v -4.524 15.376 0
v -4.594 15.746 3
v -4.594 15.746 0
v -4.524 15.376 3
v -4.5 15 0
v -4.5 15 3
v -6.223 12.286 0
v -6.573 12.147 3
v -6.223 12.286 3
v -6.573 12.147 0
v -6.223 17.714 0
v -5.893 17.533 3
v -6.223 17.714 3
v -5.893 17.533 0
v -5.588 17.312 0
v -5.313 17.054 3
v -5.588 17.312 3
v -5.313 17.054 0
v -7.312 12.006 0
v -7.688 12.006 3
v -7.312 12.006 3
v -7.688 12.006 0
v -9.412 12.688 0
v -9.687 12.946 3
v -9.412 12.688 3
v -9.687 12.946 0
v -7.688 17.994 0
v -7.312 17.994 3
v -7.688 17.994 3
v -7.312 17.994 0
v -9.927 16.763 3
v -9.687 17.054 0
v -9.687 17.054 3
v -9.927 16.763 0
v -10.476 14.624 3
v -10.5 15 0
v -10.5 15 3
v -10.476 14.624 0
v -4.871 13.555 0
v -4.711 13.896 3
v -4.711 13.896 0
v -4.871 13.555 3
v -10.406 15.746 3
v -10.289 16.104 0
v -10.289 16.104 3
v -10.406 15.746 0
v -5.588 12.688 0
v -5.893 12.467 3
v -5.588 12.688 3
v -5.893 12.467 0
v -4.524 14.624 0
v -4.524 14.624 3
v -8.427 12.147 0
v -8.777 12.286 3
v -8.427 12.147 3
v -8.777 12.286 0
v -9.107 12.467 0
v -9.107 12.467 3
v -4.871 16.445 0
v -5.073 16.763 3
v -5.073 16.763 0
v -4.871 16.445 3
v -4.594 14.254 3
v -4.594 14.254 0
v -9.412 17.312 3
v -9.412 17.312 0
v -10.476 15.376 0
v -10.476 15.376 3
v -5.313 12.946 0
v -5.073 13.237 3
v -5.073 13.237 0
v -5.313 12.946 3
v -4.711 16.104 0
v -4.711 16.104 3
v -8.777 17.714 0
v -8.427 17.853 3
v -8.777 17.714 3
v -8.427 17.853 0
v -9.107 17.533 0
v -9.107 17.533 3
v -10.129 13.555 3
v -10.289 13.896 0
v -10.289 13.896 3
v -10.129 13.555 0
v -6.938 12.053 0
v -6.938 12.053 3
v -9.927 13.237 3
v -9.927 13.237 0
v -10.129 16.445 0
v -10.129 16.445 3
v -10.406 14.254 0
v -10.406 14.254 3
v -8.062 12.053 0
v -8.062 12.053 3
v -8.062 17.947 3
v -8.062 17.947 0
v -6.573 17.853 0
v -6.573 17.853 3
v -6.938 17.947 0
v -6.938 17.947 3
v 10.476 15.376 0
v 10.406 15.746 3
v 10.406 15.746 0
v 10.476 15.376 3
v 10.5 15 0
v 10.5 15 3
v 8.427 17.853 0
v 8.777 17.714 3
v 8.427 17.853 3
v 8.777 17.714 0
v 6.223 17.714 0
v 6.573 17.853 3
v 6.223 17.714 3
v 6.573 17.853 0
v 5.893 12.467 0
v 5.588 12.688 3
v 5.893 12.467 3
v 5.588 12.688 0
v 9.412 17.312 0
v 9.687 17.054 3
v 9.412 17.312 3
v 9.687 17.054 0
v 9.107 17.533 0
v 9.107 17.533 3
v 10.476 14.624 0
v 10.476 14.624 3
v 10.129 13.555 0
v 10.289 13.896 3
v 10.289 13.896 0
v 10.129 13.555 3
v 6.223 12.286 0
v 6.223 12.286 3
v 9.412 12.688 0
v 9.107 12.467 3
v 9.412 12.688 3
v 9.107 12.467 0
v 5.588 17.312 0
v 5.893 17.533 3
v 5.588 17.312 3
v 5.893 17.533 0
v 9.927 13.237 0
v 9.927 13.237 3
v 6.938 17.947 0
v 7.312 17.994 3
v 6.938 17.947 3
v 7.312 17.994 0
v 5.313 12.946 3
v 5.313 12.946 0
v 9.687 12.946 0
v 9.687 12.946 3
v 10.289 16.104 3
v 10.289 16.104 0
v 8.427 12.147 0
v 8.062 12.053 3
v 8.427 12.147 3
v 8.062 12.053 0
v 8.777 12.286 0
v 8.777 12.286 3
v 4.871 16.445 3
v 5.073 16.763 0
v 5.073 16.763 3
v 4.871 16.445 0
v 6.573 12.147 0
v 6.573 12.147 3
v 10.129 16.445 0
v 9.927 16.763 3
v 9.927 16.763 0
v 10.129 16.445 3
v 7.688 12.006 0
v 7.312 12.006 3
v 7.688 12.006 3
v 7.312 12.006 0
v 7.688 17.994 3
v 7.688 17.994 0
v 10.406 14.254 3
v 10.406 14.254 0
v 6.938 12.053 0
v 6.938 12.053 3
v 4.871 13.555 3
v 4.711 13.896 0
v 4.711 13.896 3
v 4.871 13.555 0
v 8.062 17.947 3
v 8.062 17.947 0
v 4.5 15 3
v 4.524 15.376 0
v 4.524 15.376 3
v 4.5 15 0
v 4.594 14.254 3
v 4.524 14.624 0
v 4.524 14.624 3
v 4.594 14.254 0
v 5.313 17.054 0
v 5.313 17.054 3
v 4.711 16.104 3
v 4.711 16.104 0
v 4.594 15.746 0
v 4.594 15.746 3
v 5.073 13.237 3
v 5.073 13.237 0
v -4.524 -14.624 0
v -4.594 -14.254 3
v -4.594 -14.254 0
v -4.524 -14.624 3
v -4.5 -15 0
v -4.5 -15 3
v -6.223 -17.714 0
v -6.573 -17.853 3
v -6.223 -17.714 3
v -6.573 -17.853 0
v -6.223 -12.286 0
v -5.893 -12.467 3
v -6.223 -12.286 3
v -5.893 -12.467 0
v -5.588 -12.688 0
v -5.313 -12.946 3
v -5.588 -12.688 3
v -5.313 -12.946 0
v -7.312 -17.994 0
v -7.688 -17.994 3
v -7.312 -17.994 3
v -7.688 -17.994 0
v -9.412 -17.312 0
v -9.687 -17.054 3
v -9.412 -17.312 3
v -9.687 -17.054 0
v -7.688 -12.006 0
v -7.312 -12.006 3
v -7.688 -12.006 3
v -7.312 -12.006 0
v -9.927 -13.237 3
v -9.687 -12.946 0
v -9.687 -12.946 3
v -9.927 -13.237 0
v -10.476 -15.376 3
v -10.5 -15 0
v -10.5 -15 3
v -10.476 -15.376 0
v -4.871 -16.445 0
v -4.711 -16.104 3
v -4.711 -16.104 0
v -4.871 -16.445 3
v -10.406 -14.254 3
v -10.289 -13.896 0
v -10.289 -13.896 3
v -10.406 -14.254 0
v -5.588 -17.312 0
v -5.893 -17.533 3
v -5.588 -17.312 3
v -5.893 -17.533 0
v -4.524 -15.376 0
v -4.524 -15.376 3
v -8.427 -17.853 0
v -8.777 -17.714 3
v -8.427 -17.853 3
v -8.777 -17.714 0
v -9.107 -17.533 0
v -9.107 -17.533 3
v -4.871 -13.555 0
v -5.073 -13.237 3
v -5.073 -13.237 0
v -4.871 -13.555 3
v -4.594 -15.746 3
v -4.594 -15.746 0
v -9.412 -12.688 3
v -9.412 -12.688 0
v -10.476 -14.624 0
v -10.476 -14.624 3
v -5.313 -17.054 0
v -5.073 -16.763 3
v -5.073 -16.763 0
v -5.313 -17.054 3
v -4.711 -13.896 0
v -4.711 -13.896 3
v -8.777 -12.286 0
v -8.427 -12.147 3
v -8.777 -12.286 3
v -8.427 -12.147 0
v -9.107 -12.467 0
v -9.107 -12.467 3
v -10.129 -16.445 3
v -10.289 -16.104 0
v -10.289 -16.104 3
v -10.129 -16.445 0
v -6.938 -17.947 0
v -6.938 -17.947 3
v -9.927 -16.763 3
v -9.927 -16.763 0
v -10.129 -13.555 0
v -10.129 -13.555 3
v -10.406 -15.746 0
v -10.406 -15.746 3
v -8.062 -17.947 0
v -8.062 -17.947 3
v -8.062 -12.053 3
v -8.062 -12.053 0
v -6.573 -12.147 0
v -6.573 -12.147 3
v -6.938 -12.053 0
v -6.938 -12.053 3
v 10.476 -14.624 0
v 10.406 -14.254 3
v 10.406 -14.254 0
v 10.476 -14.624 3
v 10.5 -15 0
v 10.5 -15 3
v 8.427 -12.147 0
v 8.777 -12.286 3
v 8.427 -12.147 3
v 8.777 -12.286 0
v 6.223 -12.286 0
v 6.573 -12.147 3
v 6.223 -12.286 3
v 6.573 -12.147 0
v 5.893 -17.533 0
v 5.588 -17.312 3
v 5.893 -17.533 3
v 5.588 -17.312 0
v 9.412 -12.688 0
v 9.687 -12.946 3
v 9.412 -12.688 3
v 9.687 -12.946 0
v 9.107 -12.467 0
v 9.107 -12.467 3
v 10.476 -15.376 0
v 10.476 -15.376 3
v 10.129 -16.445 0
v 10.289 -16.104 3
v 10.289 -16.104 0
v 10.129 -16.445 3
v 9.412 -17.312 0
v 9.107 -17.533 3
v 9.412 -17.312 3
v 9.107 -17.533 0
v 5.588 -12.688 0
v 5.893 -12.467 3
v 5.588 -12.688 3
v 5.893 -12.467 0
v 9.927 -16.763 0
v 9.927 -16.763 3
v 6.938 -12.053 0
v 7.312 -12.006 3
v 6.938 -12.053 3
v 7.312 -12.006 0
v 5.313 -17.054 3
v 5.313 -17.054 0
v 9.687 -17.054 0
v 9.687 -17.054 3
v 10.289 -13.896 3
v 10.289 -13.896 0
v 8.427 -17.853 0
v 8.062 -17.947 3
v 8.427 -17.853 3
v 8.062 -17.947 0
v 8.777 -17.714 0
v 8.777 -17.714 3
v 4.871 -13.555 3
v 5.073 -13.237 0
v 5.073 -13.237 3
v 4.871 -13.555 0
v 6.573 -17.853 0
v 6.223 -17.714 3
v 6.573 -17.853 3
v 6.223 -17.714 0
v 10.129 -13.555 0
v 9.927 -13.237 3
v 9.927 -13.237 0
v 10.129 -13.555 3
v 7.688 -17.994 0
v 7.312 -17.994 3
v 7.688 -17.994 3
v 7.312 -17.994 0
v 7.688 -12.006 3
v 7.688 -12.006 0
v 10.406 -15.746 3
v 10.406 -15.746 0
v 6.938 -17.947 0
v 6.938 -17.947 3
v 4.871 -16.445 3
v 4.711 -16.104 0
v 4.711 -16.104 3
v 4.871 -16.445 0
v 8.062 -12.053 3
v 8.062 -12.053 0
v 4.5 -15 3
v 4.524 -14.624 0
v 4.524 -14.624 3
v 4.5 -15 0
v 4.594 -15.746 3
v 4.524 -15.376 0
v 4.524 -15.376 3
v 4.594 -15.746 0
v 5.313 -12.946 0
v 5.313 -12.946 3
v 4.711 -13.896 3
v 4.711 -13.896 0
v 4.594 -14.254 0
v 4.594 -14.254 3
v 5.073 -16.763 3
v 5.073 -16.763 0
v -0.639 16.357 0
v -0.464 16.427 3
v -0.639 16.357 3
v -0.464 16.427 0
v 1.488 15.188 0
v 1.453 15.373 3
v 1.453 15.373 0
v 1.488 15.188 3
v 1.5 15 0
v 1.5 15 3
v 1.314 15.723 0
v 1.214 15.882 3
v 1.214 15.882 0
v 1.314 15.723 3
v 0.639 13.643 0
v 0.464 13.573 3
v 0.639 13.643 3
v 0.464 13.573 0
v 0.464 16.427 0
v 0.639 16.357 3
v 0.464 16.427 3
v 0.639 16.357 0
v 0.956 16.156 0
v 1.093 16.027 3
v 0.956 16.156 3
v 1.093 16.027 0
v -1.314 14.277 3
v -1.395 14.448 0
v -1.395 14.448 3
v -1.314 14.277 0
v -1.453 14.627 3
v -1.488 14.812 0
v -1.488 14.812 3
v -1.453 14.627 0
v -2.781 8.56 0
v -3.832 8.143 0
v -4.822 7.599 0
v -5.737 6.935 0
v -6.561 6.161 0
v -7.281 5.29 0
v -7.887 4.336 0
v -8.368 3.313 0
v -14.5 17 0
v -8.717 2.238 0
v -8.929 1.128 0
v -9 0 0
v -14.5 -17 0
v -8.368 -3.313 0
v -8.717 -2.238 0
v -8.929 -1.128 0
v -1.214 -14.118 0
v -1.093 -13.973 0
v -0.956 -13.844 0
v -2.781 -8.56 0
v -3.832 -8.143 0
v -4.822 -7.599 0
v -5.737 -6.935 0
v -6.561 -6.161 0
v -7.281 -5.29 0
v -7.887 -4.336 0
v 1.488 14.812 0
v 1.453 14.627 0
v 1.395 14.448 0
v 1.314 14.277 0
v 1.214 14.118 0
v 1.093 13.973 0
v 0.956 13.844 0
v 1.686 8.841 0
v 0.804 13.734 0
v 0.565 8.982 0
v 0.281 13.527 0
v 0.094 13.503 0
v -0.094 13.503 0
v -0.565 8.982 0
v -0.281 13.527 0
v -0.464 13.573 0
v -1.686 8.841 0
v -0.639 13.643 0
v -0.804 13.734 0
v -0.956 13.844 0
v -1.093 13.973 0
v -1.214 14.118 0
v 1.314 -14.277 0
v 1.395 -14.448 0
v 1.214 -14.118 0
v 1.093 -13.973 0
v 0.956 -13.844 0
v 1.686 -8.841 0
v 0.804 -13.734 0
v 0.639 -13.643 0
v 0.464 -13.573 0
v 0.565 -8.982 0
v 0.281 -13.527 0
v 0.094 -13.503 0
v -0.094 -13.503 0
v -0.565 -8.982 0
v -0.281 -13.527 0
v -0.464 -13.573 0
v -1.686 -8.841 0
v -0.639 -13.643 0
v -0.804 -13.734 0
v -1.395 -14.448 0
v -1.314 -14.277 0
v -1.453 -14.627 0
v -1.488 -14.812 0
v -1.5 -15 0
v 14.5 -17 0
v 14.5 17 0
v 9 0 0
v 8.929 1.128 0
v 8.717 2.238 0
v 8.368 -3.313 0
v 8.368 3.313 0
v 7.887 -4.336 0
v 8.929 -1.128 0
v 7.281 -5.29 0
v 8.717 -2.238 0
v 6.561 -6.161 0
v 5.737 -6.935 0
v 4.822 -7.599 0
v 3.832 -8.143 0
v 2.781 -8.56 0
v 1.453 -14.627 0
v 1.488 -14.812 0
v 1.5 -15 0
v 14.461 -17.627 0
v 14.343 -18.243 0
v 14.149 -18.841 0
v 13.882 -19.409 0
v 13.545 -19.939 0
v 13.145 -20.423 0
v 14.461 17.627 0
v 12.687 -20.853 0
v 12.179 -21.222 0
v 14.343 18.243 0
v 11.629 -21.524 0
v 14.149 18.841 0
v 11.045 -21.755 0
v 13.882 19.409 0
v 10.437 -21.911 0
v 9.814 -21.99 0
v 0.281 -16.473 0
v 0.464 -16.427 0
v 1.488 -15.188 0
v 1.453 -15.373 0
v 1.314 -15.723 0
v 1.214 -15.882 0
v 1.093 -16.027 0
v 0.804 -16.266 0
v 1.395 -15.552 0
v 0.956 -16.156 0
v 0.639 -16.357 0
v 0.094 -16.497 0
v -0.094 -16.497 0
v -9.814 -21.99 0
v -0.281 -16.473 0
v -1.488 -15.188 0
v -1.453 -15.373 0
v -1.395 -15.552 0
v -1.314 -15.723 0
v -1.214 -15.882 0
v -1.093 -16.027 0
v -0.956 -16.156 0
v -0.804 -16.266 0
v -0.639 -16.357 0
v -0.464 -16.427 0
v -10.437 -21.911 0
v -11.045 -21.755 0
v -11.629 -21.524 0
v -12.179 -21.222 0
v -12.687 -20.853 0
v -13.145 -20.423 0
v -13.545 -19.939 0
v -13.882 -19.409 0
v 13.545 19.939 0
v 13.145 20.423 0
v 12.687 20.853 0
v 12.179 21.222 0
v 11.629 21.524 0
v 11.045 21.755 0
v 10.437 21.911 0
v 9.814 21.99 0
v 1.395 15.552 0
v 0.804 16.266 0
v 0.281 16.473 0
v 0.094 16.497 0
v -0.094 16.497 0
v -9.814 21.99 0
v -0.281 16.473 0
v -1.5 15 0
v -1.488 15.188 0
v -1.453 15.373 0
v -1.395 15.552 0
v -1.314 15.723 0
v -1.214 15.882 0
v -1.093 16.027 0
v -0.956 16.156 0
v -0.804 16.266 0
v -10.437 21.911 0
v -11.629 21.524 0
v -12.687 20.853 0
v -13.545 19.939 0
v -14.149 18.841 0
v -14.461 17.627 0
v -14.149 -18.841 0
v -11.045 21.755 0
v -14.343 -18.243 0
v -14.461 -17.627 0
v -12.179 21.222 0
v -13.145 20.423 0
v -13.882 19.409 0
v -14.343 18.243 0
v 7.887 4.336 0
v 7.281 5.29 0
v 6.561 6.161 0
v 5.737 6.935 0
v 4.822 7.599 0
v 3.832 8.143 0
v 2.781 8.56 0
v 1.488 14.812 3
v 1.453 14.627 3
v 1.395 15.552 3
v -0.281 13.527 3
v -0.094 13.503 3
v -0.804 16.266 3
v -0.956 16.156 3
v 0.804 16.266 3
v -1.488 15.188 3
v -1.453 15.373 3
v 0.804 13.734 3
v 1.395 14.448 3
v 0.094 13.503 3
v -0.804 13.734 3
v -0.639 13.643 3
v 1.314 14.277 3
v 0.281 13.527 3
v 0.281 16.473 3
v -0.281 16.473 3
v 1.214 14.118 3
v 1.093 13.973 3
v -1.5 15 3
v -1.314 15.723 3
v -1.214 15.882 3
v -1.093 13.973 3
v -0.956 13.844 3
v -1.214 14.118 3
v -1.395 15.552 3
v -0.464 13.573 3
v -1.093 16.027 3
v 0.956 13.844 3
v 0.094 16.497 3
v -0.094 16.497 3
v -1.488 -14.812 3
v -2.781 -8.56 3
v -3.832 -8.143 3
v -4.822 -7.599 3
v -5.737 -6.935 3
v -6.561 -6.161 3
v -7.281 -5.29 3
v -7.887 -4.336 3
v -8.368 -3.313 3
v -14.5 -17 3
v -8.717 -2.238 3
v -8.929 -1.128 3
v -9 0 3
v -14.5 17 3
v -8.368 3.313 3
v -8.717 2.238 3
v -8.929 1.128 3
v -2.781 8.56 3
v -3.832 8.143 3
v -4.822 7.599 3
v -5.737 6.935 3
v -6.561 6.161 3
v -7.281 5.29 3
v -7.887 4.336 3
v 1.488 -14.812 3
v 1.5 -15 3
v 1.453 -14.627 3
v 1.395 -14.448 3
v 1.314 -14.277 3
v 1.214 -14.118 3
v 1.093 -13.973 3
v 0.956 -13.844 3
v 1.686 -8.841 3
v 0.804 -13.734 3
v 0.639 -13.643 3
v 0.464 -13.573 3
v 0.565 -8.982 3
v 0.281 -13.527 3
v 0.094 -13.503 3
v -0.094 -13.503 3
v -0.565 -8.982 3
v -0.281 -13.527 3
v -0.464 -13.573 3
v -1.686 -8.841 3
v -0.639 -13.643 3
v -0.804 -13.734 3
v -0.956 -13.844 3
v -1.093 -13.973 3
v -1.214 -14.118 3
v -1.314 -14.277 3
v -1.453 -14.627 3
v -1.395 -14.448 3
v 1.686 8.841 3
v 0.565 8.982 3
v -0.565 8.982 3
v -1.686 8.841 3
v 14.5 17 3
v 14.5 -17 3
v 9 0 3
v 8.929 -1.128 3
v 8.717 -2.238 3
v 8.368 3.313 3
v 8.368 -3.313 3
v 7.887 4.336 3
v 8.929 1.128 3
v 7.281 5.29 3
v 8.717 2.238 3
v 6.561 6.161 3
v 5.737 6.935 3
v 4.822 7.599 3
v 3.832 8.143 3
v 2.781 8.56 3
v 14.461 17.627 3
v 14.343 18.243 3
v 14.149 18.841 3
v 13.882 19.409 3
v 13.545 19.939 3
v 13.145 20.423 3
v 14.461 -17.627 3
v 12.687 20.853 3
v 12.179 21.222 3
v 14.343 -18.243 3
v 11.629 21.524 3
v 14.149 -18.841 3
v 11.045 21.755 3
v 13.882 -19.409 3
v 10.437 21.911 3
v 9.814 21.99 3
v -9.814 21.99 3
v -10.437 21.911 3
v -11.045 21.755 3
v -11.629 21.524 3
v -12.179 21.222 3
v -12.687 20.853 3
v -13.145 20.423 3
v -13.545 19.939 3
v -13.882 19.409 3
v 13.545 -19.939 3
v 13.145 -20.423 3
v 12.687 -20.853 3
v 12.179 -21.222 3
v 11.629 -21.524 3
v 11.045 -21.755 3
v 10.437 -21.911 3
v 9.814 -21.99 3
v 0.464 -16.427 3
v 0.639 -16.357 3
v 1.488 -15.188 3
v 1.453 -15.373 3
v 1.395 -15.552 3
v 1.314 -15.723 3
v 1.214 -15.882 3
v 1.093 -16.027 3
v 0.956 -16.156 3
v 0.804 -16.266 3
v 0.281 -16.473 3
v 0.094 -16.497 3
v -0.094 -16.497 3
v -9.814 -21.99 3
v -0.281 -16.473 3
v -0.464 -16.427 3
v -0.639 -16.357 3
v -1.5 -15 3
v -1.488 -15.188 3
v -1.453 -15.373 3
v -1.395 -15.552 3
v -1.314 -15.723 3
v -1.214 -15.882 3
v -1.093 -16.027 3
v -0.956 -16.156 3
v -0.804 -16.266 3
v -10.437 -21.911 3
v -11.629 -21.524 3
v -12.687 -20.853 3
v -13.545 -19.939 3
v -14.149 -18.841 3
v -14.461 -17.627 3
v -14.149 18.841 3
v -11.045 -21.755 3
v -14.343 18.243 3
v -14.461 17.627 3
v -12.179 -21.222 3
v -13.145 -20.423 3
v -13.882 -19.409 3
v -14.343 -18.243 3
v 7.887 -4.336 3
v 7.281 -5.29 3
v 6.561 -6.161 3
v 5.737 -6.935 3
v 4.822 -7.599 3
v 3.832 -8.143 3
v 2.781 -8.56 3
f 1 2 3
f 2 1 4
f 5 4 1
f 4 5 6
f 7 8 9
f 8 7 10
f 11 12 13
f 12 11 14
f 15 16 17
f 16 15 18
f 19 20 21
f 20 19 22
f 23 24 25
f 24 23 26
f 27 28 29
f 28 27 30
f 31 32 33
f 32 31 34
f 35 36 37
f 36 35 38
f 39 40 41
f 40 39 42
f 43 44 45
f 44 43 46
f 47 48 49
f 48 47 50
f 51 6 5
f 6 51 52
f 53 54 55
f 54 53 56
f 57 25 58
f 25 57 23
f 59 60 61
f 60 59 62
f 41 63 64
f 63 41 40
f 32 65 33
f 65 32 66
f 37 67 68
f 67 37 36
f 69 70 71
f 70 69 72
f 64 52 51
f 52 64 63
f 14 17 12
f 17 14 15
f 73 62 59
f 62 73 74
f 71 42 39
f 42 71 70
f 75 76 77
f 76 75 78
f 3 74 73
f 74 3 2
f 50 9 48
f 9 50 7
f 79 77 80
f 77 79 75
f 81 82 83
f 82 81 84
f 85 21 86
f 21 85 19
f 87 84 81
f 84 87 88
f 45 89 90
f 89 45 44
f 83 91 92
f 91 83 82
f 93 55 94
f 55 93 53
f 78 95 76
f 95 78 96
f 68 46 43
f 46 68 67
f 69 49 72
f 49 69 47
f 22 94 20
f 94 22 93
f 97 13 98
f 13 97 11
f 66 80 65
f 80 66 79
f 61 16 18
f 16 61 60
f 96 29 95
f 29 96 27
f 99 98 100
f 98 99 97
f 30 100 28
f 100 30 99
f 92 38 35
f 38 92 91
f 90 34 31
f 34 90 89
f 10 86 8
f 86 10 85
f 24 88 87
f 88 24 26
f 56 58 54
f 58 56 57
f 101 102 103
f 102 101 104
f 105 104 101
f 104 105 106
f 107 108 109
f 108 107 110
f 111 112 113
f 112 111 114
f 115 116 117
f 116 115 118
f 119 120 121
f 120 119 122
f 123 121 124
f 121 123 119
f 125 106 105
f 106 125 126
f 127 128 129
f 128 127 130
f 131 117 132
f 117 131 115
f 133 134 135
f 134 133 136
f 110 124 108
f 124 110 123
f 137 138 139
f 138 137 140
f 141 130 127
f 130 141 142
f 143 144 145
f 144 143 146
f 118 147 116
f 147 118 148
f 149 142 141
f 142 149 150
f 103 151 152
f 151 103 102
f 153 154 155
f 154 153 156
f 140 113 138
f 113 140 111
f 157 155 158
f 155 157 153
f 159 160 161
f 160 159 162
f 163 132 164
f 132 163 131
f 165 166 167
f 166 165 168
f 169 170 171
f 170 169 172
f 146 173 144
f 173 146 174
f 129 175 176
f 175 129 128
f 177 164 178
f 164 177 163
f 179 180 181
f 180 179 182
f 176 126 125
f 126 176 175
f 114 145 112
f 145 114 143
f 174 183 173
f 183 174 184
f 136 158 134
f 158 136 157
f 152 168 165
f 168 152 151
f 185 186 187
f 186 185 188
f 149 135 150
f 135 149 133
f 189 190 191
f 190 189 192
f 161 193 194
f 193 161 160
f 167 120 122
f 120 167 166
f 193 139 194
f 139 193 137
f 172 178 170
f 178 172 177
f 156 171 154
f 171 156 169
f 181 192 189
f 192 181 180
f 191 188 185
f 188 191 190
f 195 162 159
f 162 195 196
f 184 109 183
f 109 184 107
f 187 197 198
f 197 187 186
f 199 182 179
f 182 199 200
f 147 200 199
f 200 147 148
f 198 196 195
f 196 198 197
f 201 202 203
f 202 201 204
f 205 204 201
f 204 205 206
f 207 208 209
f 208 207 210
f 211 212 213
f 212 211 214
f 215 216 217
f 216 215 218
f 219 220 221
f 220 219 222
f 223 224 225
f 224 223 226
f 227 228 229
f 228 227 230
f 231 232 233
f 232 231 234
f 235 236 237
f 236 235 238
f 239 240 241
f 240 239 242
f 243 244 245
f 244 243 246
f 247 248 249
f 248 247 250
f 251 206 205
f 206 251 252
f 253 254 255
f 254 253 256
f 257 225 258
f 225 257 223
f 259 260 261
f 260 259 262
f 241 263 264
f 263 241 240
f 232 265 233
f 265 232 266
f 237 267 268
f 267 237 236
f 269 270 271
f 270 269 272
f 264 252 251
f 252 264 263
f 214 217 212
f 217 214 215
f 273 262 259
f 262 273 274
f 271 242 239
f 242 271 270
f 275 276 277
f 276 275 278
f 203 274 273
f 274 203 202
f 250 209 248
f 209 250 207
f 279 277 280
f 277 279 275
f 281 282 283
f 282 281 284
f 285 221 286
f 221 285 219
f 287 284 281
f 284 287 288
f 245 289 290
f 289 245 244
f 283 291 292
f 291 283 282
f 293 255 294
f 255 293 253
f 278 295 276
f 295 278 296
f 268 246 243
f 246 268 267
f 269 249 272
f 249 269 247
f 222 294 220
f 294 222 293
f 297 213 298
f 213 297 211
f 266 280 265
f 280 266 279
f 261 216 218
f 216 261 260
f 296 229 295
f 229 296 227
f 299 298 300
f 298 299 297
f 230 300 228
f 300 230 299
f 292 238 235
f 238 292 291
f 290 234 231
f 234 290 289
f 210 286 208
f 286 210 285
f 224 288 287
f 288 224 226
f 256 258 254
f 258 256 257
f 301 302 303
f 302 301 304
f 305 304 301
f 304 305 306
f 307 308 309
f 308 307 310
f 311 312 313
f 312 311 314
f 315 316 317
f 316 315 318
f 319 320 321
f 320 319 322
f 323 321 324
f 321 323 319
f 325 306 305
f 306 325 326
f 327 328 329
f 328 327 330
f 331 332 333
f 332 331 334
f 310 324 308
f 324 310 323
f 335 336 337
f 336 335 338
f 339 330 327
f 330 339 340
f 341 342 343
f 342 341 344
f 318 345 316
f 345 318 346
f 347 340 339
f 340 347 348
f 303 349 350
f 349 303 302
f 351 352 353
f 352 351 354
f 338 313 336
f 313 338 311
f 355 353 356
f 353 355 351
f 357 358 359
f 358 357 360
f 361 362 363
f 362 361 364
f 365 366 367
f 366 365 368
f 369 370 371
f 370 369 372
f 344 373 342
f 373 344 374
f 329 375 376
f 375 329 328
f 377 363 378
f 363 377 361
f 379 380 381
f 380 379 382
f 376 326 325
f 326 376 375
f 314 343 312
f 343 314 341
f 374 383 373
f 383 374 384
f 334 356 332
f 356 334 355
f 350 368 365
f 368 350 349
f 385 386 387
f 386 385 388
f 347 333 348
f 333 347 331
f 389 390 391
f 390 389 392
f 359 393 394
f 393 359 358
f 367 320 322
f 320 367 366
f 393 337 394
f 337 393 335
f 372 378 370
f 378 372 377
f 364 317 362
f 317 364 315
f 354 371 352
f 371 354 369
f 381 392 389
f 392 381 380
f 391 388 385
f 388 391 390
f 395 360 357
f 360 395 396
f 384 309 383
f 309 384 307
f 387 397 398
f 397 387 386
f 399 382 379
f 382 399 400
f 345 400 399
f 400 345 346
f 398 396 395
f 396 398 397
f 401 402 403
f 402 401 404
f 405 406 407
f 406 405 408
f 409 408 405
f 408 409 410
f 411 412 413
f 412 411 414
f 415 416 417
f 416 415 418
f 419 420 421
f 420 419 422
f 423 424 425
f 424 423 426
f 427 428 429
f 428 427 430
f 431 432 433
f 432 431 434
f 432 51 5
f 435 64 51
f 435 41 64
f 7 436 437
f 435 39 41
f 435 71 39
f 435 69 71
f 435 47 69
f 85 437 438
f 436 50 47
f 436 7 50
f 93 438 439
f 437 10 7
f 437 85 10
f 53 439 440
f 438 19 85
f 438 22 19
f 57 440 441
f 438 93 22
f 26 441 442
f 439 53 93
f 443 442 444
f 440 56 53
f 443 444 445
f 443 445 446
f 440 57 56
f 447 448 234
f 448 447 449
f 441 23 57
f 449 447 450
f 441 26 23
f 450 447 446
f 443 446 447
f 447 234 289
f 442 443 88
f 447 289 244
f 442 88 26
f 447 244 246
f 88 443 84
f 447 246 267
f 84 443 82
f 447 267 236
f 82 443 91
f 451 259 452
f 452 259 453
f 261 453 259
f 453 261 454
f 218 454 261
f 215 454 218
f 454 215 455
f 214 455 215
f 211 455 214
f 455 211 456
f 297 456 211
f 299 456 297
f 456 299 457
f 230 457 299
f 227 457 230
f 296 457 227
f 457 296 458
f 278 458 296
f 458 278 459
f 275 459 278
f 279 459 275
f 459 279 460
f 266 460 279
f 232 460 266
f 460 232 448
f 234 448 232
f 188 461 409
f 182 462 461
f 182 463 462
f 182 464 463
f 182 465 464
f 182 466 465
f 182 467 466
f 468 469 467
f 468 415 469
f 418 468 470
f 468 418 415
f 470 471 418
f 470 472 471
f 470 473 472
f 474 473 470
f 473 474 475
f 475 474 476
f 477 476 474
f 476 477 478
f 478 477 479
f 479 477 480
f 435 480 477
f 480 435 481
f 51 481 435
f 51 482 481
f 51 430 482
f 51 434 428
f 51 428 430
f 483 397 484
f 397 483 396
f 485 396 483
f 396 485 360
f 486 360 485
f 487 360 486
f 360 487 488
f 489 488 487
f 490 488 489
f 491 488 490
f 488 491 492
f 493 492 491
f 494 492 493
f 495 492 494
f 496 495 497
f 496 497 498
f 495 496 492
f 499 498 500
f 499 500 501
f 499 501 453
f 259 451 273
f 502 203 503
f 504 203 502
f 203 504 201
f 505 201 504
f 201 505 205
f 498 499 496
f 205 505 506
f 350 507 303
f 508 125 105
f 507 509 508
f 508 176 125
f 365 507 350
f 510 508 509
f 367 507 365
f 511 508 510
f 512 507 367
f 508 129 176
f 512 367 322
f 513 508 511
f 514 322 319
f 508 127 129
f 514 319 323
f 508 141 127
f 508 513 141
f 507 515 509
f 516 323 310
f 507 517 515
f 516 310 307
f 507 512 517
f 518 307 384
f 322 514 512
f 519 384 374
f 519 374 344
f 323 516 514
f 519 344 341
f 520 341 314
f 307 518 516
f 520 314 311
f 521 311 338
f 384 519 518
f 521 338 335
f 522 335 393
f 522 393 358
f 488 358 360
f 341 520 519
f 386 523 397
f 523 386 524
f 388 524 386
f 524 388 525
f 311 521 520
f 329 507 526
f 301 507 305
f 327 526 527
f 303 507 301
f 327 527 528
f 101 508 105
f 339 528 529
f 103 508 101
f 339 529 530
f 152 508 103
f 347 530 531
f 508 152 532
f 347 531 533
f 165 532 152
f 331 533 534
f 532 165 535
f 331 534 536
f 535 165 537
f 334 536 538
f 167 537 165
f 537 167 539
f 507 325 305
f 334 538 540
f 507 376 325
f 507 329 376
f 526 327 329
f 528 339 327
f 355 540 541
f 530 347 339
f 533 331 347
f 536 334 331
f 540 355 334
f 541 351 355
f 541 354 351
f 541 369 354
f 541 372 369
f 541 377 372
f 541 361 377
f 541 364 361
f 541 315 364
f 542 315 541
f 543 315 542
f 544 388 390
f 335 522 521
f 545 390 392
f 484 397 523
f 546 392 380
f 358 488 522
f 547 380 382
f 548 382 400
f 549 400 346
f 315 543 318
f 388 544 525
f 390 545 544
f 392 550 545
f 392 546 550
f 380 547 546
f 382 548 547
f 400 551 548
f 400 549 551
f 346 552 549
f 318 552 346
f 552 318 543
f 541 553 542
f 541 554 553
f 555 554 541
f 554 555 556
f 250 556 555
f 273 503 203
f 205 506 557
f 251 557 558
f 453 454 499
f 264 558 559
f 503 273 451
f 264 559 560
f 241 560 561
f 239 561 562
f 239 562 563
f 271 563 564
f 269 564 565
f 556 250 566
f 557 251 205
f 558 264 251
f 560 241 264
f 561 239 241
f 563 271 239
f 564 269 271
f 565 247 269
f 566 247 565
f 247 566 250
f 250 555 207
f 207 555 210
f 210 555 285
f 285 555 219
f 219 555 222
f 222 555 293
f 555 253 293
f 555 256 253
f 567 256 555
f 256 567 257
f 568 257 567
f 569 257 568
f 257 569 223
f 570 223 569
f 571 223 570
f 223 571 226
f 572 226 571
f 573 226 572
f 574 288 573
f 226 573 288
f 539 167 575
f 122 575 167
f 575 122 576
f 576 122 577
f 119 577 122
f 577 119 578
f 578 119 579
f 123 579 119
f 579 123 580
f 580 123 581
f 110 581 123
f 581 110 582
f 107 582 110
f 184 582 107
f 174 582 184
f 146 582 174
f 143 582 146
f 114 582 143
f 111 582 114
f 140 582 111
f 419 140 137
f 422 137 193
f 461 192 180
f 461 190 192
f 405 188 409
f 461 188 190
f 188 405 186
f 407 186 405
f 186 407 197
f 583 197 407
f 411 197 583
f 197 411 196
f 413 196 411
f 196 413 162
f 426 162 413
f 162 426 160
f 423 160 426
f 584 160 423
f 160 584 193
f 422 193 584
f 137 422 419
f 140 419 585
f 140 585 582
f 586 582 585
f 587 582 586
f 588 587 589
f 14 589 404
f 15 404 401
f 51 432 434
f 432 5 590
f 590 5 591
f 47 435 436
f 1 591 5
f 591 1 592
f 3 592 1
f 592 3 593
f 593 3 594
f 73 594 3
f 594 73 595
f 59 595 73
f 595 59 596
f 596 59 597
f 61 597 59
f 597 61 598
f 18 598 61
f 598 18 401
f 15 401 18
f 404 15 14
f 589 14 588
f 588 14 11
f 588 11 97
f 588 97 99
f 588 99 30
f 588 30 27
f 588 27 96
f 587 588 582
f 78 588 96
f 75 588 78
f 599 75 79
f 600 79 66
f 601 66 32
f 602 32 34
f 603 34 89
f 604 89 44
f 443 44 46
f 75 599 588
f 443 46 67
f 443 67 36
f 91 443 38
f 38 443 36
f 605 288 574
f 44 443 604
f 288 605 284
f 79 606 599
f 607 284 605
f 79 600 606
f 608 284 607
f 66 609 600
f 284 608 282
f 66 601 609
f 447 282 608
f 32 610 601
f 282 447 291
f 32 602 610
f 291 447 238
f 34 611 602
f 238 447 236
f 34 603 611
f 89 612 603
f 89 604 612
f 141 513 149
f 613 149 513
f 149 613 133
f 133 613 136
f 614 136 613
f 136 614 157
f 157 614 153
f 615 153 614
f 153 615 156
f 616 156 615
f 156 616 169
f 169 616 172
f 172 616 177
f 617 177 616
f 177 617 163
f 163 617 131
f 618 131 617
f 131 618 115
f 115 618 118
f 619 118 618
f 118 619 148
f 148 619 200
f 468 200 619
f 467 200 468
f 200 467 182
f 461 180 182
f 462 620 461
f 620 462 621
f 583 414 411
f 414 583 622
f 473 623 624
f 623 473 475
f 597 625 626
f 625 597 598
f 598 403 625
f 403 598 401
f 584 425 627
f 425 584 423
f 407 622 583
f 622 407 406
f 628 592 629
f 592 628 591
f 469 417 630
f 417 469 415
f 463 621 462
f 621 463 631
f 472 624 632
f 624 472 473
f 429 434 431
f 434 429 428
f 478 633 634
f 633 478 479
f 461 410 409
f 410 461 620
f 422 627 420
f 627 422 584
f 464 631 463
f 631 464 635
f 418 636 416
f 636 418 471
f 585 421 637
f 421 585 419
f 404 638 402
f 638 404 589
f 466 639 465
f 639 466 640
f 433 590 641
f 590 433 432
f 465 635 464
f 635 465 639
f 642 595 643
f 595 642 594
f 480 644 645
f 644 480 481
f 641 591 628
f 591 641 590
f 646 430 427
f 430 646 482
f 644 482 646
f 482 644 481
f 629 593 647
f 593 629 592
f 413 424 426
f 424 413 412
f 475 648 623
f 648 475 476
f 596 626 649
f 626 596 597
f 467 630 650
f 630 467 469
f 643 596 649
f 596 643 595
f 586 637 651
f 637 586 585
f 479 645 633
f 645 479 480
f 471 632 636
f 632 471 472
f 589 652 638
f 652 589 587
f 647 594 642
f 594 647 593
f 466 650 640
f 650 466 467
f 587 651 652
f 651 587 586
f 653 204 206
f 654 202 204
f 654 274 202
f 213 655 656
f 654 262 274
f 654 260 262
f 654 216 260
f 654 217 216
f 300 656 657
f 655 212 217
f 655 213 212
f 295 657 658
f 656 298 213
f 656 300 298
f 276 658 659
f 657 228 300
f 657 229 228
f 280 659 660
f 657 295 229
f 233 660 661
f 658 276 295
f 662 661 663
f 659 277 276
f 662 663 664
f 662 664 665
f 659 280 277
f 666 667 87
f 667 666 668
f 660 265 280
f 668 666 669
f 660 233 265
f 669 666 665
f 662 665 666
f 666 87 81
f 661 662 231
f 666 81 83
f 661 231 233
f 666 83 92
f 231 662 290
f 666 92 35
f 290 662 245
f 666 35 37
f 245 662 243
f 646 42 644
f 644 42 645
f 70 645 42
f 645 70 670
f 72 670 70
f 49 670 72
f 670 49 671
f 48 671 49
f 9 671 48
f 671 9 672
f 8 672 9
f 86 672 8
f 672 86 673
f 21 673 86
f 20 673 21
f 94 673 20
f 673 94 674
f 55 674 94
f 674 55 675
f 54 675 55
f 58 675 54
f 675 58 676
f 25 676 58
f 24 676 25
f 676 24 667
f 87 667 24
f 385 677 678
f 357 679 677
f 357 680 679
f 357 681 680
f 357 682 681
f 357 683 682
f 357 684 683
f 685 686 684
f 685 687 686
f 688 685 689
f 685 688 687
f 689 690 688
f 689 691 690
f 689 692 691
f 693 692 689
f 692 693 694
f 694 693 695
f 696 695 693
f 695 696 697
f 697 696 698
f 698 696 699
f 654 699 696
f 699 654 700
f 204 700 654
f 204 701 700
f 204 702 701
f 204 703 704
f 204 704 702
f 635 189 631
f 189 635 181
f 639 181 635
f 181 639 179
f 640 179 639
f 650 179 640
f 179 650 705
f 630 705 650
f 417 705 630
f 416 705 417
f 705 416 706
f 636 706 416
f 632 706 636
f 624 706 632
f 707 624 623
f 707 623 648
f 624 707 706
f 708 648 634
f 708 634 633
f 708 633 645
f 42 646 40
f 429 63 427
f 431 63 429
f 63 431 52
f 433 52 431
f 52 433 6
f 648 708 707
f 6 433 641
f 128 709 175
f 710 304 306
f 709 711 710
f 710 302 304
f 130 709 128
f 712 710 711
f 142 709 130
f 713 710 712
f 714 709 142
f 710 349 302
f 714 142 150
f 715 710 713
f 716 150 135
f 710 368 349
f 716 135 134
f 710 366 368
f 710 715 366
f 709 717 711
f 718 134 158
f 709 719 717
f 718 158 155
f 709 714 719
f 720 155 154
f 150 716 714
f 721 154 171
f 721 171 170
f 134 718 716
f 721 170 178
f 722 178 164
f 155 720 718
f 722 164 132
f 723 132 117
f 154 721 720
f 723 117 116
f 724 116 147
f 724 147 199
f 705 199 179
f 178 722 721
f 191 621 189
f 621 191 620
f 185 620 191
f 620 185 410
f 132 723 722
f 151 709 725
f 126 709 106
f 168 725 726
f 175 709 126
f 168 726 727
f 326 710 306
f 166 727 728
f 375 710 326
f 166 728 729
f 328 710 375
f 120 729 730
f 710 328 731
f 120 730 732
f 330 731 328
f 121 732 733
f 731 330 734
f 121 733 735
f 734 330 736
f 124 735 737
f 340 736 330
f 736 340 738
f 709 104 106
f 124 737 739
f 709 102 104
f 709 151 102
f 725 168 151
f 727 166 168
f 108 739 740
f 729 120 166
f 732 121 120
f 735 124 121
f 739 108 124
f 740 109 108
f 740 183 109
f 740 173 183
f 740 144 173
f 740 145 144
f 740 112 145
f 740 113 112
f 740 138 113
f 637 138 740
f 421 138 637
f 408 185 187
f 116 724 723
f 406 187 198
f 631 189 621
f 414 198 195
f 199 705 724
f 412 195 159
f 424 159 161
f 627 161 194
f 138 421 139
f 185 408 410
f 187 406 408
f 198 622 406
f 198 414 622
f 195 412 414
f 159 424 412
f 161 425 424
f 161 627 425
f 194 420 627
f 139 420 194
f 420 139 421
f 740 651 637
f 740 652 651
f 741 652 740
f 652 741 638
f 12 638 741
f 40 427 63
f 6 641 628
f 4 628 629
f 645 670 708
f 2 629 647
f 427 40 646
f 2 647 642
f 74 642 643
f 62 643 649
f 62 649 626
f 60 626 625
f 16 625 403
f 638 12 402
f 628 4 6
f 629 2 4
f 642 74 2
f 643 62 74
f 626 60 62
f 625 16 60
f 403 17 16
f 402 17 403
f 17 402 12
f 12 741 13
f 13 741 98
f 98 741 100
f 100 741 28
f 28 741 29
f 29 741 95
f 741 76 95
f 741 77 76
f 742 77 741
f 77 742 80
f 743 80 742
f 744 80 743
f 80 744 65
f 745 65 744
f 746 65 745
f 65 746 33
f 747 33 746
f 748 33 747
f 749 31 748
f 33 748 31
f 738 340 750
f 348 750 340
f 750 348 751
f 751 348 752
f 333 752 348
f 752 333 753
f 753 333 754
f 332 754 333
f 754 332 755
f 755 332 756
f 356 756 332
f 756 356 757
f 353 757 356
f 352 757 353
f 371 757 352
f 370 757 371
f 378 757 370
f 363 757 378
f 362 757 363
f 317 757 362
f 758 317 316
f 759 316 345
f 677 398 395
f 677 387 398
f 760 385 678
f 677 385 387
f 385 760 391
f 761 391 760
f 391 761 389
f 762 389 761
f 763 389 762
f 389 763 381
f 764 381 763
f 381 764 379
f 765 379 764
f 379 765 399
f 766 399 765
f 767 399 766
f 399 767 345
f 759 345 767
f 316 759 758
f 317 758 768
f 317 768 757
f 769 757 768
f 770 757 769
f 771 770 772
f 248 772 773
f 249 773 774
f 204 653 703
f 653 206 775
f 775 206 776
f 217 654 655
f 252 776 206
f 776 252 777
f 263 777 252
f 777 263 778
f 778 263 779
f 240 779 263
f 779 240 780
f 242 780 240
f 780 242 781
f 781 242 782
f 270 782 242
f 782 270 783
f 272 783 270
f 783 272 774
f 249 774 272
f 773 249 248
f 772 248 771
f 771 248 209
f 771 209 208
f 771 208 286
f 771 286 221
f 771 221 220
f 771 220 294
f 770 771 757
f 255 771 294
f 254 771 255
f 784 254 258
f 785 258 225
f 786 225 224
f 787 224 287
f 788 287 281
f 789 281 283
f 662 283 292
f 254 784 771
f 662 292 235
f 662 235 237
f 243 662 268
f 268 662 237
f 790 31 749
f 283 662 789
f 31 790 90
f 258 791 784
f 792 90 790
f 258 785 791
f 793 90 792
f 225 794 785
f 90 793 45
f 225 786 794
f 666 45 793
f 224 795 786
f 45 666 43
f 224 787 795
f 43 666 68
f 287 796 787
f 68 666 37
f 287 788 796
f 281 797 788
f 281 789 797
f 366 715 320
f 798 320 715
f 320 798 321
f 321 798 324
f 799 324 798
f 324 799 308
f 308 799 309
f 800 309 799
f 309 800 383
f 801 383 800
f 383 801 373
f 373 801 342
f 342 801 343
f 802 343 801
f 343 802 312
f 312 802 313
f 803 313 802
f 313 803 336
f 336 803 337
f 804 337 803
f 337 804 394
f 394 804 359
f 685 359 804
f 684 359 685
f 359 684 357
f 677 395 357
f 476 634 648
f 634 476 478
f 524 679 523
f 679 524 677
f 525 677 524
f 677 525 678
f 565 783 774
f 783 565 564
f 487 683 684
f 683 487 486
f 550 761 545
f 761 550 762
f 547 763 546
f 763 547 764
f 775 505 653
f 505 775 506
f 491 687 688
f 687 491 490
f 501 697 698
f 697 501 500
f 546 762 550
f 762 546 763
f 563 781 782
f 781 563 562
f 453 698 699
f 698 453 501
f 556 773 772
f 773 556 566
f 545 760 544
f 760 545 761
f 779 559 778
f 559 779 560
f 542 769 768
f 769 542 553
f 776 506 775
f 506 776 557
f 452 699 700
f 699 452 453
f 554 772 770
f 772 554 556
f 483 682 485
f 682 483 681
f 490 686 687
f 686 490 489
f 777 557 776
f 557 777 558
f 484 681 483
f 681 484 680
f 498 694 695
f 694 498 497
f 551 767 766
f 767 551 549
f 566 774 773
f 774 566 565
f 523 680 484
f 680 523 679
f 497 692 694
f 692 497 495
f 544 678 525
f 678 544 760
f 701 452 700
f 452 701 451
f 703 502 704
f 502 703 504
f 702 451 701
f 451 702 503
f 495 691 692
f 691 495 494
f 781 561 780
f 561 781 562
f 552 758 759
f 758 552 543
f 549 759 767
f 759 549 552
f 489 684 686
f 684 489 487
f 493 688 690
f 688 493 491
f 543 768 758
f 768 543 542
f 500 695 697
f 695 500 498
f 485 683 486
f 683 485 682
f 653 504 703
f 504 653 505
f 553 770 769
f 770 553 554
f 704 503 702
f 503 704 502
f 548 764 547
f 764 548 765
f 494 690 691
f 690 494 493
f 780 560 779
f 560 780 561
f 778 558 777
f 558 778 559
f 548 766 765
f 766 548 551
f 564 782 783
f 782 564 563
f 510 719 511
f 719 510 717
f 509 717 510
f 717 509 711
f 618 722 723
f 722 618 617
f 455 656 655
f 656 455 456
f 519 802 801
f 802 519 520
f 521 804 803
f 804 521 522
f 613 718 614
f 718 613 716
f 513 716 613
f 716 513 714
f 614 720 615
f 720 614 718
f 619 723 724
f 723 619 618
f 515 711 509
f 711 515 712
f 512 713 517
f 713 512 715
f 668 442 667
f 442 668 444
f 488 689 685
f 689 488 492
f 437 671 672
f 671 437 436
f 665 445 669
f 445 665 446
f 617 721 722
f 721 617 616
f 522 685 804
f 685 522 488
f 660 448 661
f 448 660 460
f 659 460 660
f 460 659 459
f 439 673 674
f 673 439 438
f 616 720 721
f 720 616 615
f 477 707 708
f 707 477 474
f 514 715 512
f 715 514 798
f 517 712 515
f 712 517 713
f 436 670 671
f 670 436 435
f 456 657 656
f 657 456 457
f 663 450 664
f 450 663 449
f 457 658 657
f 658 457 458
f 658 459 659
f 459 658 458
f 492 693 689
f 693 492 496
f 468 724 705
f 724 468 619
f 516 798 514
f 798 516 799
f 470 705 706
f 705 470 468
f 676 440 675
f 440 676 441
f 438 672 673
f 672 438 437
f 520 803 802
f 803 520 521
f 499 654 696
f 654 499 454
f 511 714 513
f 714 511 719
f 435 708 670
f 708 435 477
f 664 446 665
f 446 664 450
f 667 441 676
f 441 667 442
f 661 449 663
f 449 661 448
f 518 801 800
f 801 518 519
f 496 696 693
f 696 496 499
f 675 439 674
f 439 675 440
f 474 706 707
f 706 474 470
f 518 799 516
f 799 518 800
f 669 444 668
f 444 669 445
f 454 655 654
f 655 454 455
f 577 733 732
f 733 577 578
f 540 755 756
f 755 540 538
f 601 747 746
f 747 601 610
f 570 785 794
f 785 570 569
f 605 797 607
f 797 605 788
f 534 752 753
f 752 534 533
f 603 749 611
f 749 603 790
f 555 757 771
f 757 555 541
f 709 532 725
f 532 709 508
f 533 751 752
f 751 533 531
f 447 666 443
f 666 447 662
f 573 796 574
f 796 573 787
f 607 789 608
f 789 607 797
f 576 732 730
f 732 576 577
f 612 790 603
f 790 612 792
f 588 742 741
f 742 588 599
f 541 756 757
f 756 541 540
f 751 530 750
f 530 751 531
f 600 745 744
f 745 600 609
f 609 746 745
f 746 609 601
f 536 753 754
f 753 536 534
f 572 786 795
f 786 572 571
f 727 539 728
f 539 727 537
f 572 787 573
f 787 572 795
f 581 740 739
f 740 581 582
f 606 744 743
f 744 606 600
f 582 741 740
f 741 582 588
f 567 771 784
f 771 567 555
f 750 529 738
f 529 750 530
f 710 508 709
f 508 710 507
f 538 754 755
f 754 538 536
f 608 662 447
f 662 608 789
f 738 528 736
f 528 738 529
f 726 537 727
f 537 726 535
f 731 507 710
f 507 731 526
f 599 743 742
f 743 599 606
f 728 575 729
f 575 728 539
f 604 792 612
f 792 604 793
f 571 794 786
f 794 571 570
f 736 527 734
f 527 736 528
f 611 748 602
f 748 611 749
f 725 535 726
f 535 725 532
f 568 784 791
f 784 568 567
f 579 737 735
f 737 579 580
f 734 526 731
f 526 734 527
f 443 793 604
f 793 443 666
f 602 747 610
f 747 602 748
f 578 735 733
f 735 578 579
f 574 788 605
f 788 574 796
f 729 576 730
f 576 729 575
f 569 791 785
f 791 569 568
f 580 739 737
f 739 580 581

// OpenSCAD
$fn = 50;


difference() {
	union() {
		hull() {
			translate(v = [-9.5000000000, 17.0000000000, 0]) {
				cylinder(h = 3, r = 5);
			}
			translate(v = [9.5000000000, 17.0000000000, 0]) {
				cylinder(h = 3, r = 5);
			}
			translate(v = [-9.5000000000, -17.0000000000, 0]) {
				cylinder(h = 3, r = 5);
			}
			translate(v = [9.5000000000, -17.0000000000, 0]) {
				cylinder(h = 3, r = 5);
			}
		}
	}
	union() {
		#translate(v = [-7.5000000000, 15.0000000000, 0]) {
			cylinder(h = 3, r = 3.0000000000);
		}
		#translate(v = [7.5000000000, 15.0000000000, 0]) {
			cylinder(h = 3, r = 3.0000000000);
		}
		#translate(v = [-7.5000000000, -15.0000000000, 0]) {
			cylinder(h = 3, r = 3.0000000000);
		}
		#translate(v = [7.5000000000, -15.0000000000, 0]) {
			cylinder(h = 3, r = 3.0000000000);
		}
		#translate(v = [-7.5000000000, -15.0000000000, -100.0000000000]) {
			cylinder(h = 200, r = 3.0000000000);
		}
		#translate(v = [-7.5000000000, 15.0000000000, -100.0000000000]) {
			cylinder(h = 200, r = 3.0000000000);
		}
		#translate(v = [7.5000000000, -15.0000000000, -100.0000000000]) {
			cylinder(h = 200, r = 3.0000000000);
		}
		#translate(v = [7.5000000000, 15.0000000000, -100.0000000000]) {
			cylinder(h = 200, r = 3.0000000000);
		}
		#translate(v = [-7.5000000000, 15.0000000000, 0]) {
			cylinder(h = 3, r = 1.5000000000);
		}
		#translate(v = [0.0000000000, 15.0000000000, 0]) {
			cylinder(h = 3, r = 1.5000000000);
		}
		#translate(v = [7.5000000000, 15.0000000000, 0]) {
			cylinder(h = 3, r = 1.5000000000);
		}
		#translate(v = [-7.5000000000, -15.0000000000, 0]) {
			cylinder(h = 3, r = 1.5000000000);
		}
		#translate(v = [0.0000000000, -15.0000000000, 0]) {
			cylinder(h = 3, r = 1.5000000000);
		}
		#translate(v = [7.5000000000, -15.0000000000, 0]) {
			cylinder(h = 3, r = 1.5000000000);
		}
		#translate(v = [-7.5000000000, 15.0000000000, 0]) {
			cylinder(h = 3, r = 1.5000000000);
		}
		#translate(v = [0.0000000000, 15.0000000000, 0]) {
			cylinder(h = 3, r = 1.5000000000);
		}
		#translate(v = [7.5000000000, 15.0000000000, 0]) {
			cylinder(h = 3, r = 1.5000000000);
		}
		#translate(v = [-7.5000000000, -15.0000000000, 0]) {
			cylinder(h = 3, r = 1.5000000000);
		}
		#translate(v = [0.0000000000, -15.0000000000, 0]) {
			cylinder(h = 3, r = 1.5000000000);
		}
		#translate(v = [7.5000000000, -15.0000000000, 0]) {
			cylinder(h = 3, r = 1.5000000000);
		}
		#translate(v = [-7.5000000000, 15.0000000000, 0]) {
			cylinder(h = 3, r = 1.5000000000);
		}
		#translate(v = [0.0000000000, 15.0000000000, 0]) {
			cylinder(h = 3, r = 1.5000000000);
		}
		#translate(v = [7.5000000000, 15.0000000000, 0]) {
			cylinder(h = 3, r = 1.5000000000);
		}
		#translate(v = [-7.5000000000, -15.0000000000, 0]) {
			cylinder(h = 3, r = 1.5000000000);
		}
		#translate(v = [0.0000000000, -15.0000000000, 0]) {
			cylinder(h = 3, r = 1.5000000000);
		}
		#translate(v = [7.5000000000, -15.0000000000, 0]) {
			cylinder(h = 3, r = 1.5000000000);
		}
		#cylinder(h = 3, r = 9.0000000000);
	}
}
